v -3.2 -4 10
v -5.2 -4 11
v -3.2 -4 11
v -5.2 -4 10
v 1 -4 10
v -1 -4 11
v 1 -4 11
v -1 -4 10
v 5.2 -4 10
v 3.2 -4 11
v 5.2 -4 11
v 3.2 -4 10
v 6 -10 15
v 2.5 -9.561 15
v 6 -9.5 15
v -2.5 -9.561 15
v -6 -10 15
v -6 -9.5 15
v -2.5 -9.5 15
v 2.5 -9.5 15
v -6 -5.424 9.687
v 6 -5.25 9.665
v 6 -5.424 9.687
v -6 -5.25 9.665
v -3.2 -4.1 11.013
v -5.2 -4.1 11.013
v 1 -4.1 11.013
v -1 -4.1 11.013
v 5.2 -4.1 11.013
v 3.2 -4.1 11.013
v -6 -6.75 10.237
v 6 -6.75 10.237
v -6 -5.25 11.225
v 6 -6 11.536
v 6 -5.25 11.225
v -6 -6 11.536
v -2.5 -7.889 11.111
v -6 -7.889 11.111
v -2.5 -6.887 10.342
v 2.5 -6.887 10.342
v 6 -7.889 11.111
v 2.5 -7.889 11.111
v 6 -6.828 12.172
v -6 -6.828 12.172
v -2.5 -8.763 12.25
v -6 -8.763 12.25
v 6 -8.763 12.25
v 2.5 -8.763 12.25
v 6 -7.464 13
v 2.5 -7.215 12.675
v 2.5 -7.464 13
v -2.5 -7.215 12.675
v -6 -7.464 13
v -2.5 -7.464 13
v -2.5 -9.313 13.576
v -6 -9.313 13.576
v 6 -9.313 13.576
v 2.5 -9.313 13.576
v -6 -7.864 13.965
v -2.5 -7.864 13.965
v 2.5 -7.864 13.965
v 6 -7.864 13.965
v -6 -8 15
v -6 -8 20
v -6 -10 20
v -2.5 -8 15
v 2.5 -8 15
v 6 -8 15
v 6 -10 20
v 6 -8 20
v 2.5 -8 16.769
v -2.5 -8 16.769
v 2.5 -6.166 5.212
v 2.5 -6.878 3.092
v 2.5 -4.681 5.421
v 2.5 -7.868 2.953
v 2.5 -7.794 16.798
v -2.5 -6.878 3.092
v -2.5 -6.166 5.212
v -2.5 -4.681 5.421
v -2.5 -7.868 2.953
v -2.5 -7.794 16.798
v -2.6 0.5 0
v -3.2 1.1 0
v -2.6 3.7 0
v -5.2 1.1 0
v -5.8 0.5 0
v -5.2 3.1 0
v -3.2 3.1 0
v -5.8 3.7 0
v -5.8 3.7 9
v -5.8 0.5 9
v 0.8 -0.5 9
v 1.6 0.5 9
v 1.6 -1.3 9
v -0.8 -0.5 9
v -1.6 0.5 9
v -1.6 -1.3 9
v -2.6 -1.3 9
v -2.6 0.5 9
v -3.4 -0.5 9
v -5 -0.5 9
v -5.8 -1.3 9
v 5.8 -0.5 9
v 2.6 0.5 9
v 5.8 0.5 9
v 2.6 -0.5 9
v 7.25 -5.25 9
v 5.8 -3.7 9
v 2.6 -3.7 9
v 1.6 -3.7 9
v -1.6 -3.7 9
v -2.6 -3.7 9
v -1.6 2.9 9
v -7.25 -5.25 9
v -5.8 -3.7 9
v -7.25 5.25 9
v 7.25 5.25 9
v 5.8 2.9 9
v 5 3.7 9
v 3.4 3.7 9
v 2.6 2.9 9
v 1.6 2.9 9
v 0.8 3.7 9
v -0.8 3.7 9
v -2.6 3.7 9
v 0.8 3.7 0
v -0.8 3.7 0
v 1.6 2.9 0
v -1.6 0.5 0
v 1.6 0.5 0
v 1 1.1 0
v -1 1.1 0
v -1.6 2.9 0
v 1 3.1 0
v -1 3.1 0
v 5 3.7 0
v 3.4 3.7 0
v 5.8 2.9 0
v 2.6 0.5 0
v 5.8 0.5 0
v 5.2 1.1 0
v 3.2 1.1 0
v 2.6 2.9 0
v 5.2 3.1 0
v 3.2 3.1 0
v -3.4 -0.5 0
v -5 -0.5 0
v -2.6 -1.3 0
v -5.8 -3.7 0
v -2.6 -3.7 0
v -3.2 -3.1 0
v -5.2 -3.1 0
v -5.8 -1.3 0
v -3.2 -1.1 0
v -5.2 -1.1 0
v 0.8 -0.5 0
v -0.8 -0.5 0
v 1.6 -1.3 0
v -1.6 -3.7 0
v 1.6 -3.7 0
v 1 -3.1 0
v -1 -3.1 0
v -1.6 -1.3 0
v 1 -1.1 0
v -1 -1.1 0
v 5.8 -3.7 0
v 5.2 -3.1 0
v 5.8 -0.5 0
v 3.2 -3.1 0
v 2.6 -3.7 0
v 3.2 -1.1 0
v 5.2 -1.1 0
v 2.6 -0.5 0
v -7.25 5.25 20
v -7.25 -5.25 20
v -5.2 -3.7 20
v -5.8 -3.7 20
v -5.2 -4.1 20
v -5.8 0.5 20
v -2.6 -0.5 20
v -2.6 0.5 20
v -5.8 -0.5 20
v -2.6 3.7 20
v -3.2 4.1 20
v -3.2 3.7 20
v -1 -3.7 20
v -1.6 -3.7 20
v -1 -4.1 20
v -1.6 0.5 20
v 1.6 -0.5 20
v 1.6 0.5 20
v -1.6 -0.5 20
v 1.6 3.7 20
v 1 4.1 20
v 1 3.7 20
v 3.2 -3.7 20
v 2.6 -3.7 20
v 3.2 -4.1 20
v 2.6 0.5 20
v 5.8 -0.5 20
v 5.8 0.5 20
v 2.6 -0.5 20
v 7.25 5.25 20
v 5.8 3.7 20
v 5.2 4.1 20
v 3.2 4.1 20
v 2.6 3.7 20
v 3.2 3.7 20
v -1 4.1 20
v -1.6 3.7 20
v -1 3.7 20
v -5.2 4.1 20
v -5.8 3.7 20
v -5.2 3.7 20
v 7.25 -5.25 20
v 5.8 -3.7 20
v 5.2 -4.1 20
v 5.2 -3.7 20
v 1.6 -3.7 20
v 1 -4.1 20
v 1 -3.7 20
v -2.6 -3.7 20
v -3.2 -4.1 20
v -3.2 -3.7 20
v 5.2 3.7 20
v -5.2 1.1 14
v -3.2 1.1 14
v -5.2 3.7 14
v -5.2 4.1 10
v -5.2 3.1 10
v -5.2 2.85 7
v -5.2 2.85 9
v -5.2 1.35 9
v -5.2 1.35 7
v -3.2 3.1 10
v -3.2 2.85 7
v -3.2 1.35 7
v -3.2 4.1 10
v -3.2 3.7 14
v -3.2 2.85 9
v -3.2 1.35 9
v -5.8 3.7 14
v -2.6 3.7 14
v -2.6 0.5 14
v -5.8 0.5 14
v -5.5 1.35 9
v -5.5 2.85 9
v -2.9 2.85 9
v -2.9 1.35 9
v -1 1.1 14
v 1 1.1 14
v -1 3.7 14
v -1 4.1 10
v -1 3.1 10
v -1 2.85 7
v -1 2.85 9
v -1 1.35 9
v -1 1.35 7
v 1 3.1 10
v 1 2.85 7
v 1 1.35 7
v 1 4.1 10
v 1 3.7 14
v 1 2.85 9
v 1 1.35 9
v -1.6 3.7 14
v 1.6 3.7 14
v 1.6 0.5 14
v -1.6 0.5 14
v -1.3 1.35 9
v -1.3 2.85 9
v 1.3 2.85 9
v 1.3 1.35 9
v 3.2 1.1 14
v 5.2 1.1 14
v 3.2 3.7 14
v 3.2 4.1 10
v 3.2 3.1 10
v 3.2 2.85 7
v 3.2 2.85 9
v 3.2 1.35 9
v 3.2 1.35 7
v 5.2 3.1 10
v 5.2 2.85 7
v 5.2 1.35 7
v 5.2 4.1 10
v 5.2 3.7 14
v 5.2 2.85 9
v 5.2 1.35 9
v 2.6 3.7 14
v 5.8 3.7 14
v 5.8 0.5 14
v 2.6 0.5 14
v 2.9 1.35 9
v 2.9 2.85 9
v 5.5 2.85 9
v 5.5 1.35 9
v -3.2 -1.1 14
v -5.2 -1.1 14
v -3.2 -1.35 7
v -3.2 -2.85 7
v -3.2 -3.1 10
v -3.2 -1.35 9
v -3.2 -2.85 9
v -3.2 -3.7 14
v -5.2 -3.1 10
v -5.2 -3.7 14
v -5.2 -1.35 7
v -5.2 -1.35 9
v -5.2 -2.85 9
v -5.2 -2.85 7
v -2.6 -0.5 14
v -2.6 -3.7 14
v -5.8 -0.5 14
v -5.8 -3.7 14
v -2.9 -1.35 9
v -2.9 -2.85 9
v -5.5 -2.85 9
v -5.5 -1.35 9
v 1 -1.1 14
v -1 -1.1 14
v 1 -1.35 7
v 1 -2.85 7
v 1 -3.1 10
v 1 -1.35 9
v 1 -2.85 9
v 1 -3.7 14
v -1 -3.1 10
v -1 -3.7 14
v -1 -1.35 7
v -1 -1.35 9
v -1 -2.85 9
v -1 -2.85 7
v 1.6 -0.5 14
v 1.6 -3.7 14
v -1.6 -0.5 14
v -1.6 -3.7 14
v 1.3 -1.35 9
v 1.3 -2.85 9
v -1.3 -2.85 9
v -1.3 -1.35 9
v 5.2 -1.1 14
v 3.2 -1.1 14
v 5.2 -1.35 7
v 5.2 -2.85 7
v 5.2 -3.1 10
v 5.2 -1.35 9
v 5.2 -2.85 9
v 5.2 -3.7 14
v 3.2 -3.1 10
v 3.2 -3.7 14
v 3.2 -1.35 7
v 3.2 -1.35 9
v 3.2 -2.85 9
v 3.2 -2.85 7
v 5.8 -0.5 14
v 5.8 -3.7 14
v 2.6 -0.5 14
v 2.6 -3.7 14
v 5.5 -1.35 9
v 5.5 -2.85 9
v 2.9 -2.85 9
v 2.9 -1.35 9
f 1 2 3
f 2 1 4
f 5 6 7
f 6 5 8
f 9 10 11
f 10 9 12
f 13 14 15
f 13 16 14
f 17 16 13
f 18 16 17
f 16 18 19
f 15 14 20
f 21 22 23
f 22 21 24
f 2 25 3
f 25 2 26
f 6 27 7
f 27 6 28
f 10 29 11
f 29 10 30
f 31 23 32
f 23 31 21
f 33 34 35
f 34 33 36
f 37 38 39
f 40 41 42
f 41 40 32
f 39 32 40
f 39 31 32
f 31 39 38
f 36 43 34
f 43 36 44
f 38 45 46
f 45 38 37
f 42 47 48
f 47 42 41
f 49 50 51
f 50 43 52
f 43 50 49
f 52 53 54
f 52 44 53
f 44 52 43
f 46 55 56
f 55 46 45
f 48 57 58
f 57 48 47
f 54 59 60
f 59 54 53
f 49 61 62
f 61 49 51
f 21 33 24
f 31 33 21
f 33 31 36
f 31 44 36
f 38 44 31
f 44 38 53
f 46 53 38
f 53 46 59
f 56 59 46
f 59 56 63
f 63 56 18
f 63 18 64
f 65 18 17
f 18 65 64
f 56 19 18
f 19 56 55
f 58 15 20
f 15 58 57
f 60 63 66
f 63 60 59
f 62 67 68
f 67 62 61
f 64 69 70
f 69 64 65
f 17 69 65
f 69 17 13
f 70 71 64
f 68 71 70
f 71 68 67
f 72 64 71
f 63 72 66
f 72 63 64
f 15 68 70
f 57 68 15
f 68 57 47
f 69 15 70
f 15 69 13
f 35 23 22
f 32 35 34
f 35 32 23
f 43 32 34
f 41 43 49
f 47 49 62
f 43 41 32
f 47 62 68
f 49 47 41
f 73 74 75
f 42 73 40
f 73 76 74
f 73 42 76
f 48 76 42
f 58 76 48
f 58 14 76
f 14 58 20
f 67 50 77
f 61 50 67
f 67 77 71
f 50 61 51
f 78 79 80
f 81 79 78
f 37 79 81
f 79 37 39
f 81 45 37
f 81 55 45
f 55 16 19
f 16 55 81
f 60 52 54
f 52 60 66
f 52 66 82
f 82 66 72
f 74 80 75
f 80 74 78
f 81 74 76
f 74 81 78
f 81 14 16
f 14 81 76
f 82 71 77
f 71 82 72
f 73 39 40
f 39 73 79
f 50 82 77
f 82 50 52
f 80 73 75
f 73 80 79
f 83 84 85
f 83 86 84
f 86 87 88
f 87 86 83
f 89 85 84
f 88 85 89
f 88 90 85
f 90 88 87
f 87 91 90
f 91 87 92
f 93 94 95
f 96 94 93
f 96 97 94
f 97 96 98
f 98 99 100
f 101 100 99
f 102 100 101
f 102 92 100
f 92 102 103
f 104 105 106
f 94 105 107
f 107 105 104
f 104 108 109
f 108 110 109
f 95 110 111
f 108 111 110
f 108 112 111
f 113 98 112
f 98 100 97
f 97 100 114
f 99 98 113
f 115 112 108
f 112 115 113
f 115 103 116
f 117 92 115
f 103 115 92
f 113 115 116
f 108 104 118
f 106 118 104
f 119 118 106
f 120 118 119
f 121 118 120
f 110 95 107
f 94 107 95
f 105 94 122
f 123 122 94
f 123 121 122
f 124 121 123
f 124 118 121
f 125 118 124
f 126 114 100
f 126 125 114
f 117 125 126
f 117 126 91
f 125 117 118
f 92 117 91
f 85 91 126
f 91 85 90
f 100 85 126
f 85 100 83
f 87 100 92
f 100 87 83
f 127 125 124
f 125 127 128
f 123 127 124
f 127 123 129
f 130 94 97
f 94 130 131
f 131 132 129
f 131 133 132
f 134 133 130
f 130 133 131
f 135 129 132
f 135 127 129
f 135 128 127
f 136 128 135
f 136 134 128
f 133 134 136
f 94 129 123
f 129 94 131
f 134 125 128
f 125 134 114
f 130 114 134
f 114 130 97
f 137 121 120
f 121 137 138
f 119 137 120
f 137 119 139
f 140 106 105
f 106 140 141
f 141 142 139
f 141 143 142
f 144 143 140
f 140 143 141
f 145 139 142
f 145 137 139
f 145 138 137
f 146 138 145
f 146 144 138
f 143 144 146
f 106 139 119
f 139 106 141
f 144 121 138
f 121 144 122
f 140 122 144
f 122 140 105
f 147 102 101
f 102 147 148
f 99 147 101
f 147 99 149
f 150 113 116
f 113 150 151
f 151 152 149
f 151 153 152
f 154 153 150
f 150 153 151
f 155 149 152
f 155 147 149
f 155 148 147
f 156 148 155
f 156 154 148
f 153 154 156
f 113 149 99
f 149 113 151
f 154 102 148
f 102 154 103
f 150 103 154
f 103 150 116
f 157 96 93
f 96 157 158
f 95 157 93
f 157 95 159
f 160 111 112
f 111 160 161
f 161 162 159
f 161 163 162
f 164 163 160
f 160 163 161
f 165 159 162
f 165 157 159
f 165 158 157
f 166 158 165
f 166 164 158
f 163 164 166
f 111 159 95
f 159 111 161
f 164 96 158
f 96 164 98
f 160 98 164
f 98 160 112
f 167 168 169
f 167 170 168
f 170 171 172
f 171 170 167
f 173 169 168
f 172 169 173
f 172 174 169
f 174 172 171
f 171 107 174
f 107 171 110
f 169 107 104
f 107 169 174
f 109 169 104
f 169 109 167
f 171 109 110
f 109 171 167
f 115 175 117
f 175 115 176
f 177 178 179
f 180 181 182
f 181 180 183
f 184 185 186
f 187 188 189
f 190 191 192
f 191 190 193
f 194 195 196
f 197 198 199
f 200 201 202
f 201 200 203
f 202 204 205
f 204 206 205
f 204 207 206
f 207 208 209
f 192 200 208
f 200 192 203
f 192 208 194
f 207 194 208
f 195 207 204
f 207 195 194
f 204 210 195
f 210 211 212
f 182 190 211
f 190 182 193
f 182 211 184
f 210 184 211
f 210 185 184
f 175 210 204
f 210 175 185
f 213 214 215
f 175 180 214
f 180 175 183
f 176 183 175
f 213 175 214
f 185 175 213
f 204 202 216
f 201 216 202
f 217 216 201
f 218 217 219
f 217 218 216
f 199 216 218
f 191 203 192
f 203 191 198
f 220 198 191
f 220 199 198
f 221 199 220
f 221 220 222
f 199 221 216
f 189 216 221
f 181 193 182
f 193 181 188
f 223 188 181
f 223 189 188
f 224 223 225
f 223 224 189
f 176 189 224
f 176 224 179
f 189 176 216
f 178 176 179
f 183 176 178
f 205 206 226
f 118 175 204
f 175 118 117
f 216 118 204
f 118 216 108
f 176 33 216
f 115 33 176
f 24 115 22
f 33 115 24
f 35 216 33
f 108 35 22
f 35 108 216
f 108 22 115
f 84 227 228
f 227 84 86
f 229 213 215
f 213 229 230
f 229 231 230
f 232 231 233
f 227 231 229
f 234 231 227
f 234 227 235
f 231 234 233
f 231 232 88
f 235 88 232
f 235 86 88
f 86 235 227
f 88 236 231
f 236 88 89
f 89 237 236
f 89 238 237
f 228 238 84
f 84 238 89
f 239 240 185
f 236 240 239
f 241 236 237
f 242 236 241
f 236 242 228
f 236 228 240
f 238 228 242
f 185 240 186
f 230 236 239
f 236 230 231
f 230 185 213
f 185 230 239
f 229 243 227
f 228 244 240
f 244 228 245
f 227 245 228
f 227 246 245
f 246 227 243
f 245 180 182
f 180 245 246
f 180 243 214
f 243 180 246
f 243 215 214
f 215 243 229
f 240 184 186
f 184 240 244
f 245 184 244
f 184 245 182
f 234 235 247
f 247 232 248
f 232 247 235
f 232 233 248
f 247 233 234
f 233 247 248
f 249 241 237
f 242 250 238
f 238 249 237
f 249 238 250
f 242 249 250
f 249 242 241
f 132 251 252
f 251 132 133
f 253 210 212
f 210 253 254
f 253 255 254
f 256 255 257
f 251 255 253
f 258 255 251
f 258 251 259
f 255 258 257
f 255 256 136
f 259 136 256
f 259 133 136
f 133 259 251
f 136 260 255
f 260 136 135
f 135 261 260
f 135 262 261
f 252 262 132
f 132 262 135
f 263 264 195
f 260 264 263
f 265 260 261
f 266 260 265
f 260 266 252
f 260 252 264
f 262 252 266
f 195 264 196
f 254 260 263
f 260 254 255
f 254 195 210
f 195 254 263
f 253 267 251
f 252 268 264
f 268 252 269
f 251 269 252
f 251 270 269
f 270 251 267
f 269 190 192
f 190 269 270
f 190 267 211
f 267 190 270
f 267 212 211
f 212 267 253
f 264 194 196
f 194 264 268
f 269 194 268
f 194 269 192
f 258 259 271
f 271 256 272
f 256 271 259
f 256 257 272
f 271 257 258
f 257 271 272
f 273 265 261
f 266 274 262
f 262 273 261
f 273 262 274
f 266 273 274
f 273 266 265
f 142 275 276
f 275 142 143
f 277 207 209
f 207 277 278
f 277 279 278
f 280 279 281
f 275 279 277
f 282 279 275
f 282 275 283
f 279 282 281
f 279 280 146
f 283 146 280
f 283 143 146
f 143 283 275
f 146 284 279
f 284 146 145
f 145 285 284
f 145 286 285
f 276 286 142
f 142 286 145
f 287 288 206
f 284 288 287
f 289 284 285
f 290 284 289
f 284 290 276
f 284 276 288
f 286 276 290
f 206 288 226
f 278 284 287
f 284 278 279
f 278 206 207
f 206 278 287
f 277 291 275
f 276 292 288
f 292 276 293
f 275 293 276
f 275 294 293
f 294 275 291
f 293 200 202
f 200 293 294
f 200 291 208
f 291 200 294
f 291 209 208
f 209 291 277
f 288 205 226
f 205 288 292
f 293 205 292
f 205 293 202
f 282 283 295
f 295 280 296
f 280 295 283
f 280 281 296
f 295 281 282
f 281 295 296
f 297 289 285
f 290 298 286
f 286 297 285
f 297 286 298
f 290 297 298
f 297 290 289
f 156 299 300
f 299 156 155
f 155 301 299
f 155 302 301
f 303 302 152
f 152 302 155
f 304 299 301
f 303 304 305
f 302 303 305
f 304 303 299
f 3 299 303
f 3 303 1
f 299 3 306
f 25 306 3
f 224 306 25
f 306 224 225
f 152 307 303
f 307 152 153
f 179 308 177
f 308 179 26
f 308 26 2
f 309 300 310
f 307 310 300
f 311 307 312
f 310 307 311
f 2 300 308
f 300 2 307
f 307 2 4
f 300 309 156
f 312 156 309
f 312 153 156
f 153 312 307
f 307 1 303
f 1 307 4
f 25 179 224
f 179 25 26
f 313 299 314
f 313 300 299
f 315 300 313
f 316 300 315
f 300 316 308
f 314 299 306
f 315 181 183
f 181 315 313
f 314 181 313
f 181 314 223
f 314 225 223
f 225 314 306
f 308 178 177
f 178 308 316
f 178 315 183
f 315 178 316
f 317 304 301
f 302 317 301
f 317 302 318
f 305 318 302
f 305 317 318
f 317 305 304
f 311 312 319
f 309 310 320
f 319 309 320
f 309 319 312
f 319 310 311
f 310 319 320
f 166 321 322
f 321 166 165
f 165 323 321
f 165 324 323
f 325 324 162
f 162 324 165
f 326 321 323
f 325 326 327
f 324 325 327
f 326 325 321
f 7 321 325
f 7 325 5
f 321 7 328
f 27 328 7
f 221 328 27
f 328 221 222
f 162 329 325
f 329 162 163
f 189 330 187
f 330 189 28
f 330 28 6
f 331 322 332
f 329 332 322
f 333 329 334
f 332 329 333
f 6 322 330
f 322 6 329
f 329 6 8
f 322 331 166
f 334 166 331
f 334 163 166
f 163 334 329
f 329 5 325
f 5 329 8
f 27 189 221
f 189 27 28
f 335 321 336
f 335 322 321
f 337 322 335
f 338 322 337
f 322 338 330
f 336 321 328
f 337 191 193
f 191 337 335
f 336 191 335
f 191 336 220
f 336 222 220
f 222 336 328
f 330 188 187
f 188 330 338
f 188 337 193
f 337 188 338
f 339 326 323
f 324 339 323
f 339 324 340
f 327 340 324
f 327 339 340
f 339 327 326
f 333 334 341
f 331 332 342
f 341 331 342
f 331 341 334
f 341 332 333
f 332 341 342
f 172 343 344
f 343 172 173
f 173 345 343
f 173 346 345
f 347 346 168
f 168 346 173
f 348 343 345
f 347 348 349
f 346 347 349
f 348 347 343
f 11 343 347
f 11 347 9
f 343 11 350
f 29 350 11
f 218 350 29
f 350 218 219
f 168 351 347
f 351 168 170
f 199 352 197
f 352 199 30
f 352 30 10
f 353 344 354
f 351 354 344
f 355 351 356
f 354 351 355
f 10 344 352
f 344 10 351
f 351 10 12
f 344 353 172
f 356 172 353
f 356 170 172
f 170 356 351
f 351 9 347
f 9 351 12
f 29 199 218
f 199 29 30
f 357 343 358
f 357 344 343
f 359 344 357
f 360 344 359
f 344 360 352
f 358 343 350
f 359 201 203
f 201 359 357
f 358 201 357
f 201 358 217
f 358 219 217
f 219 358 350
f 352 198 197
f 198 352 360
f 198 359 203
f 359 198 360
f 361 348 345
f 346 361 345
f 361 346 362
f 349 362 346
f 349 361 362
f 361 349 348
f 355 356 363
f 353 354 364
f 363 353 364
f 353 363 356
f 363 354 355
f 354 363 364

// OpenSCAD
$fn = 25;

pin_d = 2;
pin_w = 2;
pin_h = 20;

pin_top_d=3;
pin_top_w=2;
pin_top_h=pin_h-10;


pin_top2_d=3.2;
pin_top2_w=3.2;
pin_top2_h=pin_h-14;

pin_ext_d=3.2;

p_pos_h=7;

dis = 4.2;

pins = [
  [-1, .5, 0],
  [0, .5, 1],
  [1, .5, 1],
  [-1, -.5, 1],
  [0, -.5, 1],
  [1, -.5, 0]
];

module p() {
  translate(
    [
    0,
    0,
    2
    ]
  )  
  rotate(
    [
    0,
    90,
    0
    ]  
  )
  translate(
    [
    0,
    0,
    -1.5/2
    ]
  )
  linear_extrude(
    height=1.5
  )
  polygon(
    [
    [0, 0],
    [0, 0.3],
    [2, 0]
    ]
  );
}

module pin() {
  linear_extrude(height=pin_h)
  square([pin_d, pin_w], center=true);
 
  translate(
    [
      (pin_top_d-pin_d)/2,
      0,
      pin_h-pin_top_h
    ]
  )
  linear_extrude(height=pin_top_h)
  square([pin_top_d, pin_top_w], center=true);
    
  translate(
    [
      0,
      0,
      pin_h-pin_top2_h
    ]
  )
  linear_extrude(height=pin_top2_h)
  square([pin_top2_d, pin_top2_w], center=true);
    translate(
    [
    0,
    pin_d/2,
    p_pos_h
    ]
    )
    p();
    
    rotate(
    [
    0,
    0,
    180
    ]
    )
    translate(
    [
    0,
    pin_d/2,
    p_pos_h
    ]
    )
    p();
}

module pin_bottom_body_cut() {
    linear_extrude(height=9)
    polygon(
    [
    [-pin_ext_d/2, -pin_ext_d/2],
    [pin_ext_d/2, -pin_ext_d/2],
    [pin_ext_d/2, (pin_ext_d/2)/2],
    [(pin_ext_d/2)/2, pin_ext_d/2],
    [-(pin_ext_d/2)/2, pin_ext_d/2],
    [-pin_ext_d/2, (pin_ext_d/2)/2]
    ]
    );
}

module pin_bottom_body_rec() {
    linear_extrude(height=9)
    square(
    [pin_ext_d, pin_ext_d], center=true
    );
}

module body() {
    translate(
    [
    0,
    0,
    9
    ]
    )
    linear_extrude(height=11)
    square([14.5, 10.5], center=true);
}


module clip() {
   #translate(
    [
    -1.2,
    0,
    9
    ]
    )
   rotate(
    [
    -90,
    -8,
    0
    ]
    )
   translate(
    [
    0,
    0,
    -2.5
    ]
    )
   linear_extrude(height=5)
   union() {
       translate(
        [
        0, 2
        ]
       )
       polygon(
       [
        [-1, 0],
        [1, 0],
        [1, -1],
        [-1, -5]
       ] 
       );
       translate(
        [
        0, 1.8
        ]
       )
       square([2, 12], center=true);
       translate(
        [
        0, 6.5
        ]
       )
       polygon(
       [
        [-1, 0],
        [1, 0],
        [1, 1],
        [2.5, 1],
        [0, 3],
        [-1, 3]
       ] 
       );
   }
   
   translate(
   [
   3,
   0,
   11.5
   ]
   )
   rotate(
   [
   0,
   90,
   90
   ]
   )
   both_flex();
}

module flex() {
   translate([
    0,
    0,
    -1
    ]) {
   rotate_extrude(angle=90)
   translate([4, -3])
   square([1.5, 6]);
   
   translate([
    0,
    0,
    -3
    ])
   linear_extrude(height=6)
   translate([
   -5,
    4
   ])
   square([5, 2]);
   }
}

module both_flex() {
   translate(
    [
    0,
    0,
    4
    ]
    )
   flex();
   translate(
    [
    0,
    0,
    -2
    ]
    )
   flex();
}


translate(
[
00,
-7,
3.5
]
)
rotate(
[
0,
0,
90
]
)
clip();


difference() {
    union() {
        body();
        for( pin = pins ) {
          translate(
          [
            dis*pin.x,
            dis*pin.y,
            0
          ]
          )
          if (pin.z==0) {
            pin_bottom_body_rec();
          } else {
            pin_bottom_body_cut();
          }
        }
    };

    for( pin = pins ) {
      translate(
      [
        dis*pin.x,
        dis*pin.y,
        0
      ]
      )
      rotate(
      [
      0,
      0,
      180*pin.y  
      ]  
      )
      pin();
    }
}
